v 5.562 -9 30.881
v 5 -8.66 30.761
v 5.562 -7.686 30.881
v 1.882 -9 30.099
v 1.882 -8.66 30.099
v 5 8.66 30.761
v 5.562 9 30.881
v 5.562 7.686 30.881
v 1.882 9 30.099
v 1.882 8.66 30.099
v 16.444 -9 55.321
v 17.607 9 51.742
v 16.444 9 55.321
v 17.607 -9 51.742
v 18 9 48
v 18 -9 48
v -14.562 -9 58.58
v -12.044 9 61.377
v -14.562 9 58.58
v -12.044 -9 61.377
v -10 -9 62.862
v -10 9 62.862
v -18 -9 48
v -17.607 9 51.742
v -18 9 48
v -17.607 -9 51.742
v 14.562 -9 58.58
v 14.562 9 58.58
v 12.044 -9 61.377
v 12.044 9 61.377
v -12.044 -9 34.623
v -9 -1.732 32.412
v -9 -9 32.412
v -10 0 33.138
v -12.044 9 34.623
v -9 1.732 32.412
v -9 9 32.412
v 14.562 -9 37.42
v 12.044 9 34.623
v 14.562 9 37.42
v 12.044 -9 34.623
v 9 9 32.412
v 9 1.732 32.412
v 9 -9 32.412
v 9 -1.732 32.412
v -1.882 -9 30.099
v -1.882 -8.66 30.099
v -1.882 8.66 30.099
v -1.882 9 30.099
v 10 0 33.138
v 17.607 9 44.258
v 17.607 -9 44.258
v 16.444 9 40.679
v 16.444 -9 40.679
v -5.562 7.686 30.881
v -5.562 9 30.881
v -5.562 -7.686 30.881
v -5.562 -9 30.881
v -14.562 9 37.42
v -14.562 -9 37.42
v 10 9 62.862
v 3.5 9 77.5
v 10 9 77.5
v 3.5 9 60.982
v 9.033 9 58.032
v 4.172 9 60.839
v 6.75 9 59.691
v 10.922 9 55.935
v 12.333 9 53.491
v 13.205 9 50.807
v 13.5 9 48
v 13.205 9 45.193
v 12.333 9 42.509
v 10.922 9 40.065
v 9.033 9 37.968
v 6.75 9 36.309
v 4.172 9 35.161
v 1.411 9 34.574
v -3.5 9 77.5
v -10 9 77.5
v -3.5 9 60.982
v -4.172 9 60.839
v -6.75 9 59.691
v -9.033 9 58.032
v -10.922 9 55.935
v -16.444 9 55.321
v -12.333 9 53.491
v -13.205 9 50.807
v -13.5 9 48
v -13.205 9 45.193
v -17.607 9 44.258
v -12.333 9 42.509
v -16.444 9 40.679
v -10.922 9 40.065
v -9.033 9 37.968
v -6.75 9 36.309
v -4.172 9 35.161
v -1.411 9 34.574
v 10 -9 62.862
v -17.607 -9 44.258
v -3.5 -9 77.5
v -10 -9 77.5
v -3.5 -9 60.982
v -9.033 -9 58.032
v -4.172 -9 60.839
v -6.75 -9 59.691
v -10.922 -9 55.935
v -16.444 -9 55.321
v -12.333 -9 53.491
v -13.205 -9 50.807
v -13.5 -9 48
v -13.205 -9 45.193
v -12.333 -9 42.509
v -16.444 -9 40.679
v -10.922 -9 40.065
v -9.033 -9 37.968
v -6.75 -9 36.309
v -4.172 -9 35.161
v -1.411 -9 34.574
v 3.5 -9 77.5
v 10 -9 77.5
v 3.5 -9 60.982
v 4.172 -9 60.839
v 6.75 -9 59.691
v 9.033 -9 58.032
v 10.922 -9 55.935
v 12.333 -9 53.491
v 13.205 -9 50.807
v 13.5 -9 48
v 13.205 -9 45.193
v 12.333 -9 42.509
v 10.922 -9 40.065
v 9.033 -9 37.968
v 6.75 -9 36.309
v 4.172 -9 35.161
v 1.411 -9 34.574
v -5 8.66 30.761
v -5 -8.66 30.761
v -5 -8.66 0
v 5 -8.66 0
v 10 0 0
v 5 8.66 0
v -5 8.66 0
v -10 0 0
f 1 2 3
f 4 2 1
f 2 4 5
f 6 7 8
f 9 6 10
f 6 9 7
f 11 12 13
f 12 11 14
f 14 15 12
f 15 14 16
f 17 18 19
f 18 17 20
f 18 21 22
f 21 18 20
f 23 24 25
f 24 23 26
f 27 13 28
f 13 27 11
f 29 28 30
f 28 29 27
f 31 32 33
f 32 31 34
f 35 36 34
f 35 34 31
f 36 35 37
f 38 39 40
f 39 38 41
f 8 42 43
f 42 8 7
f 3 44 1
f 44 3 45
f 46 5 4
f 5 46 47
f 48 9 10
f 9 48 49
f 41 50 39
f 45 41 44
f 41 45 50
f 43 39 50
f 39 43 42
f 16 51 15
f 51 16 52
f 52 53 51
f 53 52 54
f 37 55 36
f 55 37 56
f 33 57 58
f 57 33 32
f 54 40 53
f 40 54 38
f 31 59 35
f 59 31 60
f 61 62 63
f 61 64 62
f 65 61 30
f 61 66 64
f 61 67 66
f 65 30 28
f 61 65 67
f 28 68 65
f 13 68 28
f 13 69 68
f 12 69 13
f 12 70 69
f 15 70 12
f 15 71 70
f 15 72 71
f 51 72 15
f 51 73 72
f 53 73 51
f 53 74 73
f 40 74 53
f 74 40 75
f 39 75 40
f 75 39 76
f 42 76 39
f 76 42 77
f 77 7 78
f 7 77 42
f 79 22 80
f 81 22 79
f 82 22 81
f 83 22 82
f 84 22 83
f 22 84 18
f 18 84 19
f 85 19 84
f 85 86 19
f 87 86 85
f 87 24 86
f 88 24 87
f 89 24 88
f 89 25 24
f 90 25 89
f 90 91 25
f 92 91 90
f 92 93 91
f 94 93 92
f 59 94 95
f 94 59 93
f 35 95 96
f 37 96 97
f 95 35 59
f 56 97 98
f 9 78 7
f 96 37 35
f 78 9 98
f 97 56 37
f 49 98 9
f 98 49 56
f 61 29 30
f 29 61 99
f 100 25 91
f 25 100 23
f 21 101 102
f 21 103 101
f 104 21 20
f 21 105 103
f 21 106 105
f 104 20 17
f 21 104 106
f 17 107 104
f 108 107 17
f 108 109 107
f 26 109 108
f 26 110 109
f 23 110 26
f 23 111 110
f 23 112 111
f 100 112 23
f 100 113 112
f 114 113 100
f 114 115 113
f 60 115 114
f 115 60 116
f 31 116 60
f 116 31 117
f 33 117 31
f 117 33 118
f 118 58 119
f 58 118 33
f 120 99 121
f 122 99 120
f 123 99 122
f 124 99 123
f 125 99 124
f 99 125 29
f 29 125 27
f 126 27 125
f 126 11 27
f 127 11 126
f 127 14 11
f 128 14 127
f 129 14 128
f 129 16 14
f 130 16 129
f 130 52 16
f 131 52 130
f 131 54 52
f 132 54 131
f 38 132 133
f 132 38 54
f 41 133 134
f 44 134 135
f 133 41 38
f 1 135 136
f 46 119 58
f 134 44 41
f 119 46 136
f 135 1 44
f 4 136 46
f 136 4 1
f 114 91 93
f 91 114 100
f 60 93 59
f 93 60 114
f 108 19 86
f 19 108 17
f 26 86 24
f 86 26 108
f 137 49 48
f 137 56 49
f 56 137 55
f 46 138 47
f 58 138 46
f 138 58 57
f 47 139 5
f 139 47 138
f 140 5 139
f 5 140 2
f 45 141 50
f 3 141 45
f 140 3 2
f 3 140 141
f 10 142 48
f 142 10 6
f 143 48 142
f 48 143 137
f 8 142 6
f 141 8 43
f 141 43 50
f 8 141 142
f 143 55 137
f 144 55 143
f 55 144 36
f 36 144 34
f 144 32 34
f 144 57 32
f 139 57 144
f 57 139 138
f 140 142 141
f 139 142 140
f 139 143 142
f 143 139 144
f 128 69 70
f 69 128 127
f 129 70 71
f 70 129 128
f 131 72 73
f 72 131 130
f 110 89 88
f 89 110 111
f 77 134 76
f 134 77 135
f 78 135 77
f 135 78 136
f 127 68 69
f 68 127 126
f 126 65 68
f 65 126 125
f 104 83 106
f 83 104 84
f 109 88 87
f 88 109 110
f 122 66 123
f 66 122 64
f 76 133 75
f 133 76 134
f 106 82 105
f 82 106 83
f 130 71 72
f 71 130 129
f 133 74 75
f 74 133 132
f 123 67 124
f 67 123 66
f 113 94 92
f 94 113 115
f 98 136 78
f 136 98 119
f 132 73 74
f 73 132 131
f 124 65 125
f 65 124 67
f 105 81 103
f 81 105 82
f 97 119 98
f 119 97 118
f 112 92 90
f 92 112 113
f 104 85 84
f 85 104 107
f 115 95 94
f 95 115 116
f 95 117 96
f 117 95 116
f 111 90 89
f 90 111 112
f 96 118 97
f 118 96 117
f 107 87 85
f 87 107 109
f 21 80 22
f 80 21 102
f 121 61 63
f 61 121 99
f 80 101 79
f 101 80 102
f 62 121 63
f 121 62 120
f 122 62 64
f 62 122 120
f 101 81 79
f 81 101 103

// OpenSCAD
difference() 
{ 
// ode�et distan�n� mezery


union() 
{
// p�i�ten� patic pro sta�en�

difference() 
{ 
// diffference pro  otvor pro osazen� na ty�



union() 
{
// union pro v�lec napojen� na cylinder pro zasazen� do rukojeti

union() 
// union pro p�ipojen� cylinderu na v�lec
{


//cylinder(h = 14, r1 = 17, r2 = 10, center = true); 
//cylinder-nepouzite skoseni napojeni tyce pro usazeni v rukojeti

//zakladn�
#translate([0,9,48]) rotate ([90,0,0])cylinder(h = 18, r=18);
// 40 je nastavena vnitrni prumer na 35 a vnejsi na 40
        
} 
translate([0,0,0]) rotate ([0,0,0]) cylinder(h=35, r=10,$fn=6); 
// umisteni ctverce pro dosazeni do rukojeti
//tloustka operky je 4mm + 14mm pro zesileni
//19 je posun nahoru a dolu/////35 vyska propojky
}
translate([0,10,48]) rotate ([90,0,0])cylinder(h = 20, r=13.5);
// odecitaci valec pro otvor na osazen� ty�e

//27 je vnitrni prumer

}
translate([0,0,70]) rotate ([90,0,0]) cube(size = [20,15,18], center = true);
//sloupky pro utazeni
}
translate([0,10,80]) rotate ([0,0,0])cube(size = [7,50,40], center = true);
//odecet distancni mezery
}        


//# pro zviditeleneni
//priblizeni shift+prav tlacitko mysi+ pousouvani dopredu/dozadu
